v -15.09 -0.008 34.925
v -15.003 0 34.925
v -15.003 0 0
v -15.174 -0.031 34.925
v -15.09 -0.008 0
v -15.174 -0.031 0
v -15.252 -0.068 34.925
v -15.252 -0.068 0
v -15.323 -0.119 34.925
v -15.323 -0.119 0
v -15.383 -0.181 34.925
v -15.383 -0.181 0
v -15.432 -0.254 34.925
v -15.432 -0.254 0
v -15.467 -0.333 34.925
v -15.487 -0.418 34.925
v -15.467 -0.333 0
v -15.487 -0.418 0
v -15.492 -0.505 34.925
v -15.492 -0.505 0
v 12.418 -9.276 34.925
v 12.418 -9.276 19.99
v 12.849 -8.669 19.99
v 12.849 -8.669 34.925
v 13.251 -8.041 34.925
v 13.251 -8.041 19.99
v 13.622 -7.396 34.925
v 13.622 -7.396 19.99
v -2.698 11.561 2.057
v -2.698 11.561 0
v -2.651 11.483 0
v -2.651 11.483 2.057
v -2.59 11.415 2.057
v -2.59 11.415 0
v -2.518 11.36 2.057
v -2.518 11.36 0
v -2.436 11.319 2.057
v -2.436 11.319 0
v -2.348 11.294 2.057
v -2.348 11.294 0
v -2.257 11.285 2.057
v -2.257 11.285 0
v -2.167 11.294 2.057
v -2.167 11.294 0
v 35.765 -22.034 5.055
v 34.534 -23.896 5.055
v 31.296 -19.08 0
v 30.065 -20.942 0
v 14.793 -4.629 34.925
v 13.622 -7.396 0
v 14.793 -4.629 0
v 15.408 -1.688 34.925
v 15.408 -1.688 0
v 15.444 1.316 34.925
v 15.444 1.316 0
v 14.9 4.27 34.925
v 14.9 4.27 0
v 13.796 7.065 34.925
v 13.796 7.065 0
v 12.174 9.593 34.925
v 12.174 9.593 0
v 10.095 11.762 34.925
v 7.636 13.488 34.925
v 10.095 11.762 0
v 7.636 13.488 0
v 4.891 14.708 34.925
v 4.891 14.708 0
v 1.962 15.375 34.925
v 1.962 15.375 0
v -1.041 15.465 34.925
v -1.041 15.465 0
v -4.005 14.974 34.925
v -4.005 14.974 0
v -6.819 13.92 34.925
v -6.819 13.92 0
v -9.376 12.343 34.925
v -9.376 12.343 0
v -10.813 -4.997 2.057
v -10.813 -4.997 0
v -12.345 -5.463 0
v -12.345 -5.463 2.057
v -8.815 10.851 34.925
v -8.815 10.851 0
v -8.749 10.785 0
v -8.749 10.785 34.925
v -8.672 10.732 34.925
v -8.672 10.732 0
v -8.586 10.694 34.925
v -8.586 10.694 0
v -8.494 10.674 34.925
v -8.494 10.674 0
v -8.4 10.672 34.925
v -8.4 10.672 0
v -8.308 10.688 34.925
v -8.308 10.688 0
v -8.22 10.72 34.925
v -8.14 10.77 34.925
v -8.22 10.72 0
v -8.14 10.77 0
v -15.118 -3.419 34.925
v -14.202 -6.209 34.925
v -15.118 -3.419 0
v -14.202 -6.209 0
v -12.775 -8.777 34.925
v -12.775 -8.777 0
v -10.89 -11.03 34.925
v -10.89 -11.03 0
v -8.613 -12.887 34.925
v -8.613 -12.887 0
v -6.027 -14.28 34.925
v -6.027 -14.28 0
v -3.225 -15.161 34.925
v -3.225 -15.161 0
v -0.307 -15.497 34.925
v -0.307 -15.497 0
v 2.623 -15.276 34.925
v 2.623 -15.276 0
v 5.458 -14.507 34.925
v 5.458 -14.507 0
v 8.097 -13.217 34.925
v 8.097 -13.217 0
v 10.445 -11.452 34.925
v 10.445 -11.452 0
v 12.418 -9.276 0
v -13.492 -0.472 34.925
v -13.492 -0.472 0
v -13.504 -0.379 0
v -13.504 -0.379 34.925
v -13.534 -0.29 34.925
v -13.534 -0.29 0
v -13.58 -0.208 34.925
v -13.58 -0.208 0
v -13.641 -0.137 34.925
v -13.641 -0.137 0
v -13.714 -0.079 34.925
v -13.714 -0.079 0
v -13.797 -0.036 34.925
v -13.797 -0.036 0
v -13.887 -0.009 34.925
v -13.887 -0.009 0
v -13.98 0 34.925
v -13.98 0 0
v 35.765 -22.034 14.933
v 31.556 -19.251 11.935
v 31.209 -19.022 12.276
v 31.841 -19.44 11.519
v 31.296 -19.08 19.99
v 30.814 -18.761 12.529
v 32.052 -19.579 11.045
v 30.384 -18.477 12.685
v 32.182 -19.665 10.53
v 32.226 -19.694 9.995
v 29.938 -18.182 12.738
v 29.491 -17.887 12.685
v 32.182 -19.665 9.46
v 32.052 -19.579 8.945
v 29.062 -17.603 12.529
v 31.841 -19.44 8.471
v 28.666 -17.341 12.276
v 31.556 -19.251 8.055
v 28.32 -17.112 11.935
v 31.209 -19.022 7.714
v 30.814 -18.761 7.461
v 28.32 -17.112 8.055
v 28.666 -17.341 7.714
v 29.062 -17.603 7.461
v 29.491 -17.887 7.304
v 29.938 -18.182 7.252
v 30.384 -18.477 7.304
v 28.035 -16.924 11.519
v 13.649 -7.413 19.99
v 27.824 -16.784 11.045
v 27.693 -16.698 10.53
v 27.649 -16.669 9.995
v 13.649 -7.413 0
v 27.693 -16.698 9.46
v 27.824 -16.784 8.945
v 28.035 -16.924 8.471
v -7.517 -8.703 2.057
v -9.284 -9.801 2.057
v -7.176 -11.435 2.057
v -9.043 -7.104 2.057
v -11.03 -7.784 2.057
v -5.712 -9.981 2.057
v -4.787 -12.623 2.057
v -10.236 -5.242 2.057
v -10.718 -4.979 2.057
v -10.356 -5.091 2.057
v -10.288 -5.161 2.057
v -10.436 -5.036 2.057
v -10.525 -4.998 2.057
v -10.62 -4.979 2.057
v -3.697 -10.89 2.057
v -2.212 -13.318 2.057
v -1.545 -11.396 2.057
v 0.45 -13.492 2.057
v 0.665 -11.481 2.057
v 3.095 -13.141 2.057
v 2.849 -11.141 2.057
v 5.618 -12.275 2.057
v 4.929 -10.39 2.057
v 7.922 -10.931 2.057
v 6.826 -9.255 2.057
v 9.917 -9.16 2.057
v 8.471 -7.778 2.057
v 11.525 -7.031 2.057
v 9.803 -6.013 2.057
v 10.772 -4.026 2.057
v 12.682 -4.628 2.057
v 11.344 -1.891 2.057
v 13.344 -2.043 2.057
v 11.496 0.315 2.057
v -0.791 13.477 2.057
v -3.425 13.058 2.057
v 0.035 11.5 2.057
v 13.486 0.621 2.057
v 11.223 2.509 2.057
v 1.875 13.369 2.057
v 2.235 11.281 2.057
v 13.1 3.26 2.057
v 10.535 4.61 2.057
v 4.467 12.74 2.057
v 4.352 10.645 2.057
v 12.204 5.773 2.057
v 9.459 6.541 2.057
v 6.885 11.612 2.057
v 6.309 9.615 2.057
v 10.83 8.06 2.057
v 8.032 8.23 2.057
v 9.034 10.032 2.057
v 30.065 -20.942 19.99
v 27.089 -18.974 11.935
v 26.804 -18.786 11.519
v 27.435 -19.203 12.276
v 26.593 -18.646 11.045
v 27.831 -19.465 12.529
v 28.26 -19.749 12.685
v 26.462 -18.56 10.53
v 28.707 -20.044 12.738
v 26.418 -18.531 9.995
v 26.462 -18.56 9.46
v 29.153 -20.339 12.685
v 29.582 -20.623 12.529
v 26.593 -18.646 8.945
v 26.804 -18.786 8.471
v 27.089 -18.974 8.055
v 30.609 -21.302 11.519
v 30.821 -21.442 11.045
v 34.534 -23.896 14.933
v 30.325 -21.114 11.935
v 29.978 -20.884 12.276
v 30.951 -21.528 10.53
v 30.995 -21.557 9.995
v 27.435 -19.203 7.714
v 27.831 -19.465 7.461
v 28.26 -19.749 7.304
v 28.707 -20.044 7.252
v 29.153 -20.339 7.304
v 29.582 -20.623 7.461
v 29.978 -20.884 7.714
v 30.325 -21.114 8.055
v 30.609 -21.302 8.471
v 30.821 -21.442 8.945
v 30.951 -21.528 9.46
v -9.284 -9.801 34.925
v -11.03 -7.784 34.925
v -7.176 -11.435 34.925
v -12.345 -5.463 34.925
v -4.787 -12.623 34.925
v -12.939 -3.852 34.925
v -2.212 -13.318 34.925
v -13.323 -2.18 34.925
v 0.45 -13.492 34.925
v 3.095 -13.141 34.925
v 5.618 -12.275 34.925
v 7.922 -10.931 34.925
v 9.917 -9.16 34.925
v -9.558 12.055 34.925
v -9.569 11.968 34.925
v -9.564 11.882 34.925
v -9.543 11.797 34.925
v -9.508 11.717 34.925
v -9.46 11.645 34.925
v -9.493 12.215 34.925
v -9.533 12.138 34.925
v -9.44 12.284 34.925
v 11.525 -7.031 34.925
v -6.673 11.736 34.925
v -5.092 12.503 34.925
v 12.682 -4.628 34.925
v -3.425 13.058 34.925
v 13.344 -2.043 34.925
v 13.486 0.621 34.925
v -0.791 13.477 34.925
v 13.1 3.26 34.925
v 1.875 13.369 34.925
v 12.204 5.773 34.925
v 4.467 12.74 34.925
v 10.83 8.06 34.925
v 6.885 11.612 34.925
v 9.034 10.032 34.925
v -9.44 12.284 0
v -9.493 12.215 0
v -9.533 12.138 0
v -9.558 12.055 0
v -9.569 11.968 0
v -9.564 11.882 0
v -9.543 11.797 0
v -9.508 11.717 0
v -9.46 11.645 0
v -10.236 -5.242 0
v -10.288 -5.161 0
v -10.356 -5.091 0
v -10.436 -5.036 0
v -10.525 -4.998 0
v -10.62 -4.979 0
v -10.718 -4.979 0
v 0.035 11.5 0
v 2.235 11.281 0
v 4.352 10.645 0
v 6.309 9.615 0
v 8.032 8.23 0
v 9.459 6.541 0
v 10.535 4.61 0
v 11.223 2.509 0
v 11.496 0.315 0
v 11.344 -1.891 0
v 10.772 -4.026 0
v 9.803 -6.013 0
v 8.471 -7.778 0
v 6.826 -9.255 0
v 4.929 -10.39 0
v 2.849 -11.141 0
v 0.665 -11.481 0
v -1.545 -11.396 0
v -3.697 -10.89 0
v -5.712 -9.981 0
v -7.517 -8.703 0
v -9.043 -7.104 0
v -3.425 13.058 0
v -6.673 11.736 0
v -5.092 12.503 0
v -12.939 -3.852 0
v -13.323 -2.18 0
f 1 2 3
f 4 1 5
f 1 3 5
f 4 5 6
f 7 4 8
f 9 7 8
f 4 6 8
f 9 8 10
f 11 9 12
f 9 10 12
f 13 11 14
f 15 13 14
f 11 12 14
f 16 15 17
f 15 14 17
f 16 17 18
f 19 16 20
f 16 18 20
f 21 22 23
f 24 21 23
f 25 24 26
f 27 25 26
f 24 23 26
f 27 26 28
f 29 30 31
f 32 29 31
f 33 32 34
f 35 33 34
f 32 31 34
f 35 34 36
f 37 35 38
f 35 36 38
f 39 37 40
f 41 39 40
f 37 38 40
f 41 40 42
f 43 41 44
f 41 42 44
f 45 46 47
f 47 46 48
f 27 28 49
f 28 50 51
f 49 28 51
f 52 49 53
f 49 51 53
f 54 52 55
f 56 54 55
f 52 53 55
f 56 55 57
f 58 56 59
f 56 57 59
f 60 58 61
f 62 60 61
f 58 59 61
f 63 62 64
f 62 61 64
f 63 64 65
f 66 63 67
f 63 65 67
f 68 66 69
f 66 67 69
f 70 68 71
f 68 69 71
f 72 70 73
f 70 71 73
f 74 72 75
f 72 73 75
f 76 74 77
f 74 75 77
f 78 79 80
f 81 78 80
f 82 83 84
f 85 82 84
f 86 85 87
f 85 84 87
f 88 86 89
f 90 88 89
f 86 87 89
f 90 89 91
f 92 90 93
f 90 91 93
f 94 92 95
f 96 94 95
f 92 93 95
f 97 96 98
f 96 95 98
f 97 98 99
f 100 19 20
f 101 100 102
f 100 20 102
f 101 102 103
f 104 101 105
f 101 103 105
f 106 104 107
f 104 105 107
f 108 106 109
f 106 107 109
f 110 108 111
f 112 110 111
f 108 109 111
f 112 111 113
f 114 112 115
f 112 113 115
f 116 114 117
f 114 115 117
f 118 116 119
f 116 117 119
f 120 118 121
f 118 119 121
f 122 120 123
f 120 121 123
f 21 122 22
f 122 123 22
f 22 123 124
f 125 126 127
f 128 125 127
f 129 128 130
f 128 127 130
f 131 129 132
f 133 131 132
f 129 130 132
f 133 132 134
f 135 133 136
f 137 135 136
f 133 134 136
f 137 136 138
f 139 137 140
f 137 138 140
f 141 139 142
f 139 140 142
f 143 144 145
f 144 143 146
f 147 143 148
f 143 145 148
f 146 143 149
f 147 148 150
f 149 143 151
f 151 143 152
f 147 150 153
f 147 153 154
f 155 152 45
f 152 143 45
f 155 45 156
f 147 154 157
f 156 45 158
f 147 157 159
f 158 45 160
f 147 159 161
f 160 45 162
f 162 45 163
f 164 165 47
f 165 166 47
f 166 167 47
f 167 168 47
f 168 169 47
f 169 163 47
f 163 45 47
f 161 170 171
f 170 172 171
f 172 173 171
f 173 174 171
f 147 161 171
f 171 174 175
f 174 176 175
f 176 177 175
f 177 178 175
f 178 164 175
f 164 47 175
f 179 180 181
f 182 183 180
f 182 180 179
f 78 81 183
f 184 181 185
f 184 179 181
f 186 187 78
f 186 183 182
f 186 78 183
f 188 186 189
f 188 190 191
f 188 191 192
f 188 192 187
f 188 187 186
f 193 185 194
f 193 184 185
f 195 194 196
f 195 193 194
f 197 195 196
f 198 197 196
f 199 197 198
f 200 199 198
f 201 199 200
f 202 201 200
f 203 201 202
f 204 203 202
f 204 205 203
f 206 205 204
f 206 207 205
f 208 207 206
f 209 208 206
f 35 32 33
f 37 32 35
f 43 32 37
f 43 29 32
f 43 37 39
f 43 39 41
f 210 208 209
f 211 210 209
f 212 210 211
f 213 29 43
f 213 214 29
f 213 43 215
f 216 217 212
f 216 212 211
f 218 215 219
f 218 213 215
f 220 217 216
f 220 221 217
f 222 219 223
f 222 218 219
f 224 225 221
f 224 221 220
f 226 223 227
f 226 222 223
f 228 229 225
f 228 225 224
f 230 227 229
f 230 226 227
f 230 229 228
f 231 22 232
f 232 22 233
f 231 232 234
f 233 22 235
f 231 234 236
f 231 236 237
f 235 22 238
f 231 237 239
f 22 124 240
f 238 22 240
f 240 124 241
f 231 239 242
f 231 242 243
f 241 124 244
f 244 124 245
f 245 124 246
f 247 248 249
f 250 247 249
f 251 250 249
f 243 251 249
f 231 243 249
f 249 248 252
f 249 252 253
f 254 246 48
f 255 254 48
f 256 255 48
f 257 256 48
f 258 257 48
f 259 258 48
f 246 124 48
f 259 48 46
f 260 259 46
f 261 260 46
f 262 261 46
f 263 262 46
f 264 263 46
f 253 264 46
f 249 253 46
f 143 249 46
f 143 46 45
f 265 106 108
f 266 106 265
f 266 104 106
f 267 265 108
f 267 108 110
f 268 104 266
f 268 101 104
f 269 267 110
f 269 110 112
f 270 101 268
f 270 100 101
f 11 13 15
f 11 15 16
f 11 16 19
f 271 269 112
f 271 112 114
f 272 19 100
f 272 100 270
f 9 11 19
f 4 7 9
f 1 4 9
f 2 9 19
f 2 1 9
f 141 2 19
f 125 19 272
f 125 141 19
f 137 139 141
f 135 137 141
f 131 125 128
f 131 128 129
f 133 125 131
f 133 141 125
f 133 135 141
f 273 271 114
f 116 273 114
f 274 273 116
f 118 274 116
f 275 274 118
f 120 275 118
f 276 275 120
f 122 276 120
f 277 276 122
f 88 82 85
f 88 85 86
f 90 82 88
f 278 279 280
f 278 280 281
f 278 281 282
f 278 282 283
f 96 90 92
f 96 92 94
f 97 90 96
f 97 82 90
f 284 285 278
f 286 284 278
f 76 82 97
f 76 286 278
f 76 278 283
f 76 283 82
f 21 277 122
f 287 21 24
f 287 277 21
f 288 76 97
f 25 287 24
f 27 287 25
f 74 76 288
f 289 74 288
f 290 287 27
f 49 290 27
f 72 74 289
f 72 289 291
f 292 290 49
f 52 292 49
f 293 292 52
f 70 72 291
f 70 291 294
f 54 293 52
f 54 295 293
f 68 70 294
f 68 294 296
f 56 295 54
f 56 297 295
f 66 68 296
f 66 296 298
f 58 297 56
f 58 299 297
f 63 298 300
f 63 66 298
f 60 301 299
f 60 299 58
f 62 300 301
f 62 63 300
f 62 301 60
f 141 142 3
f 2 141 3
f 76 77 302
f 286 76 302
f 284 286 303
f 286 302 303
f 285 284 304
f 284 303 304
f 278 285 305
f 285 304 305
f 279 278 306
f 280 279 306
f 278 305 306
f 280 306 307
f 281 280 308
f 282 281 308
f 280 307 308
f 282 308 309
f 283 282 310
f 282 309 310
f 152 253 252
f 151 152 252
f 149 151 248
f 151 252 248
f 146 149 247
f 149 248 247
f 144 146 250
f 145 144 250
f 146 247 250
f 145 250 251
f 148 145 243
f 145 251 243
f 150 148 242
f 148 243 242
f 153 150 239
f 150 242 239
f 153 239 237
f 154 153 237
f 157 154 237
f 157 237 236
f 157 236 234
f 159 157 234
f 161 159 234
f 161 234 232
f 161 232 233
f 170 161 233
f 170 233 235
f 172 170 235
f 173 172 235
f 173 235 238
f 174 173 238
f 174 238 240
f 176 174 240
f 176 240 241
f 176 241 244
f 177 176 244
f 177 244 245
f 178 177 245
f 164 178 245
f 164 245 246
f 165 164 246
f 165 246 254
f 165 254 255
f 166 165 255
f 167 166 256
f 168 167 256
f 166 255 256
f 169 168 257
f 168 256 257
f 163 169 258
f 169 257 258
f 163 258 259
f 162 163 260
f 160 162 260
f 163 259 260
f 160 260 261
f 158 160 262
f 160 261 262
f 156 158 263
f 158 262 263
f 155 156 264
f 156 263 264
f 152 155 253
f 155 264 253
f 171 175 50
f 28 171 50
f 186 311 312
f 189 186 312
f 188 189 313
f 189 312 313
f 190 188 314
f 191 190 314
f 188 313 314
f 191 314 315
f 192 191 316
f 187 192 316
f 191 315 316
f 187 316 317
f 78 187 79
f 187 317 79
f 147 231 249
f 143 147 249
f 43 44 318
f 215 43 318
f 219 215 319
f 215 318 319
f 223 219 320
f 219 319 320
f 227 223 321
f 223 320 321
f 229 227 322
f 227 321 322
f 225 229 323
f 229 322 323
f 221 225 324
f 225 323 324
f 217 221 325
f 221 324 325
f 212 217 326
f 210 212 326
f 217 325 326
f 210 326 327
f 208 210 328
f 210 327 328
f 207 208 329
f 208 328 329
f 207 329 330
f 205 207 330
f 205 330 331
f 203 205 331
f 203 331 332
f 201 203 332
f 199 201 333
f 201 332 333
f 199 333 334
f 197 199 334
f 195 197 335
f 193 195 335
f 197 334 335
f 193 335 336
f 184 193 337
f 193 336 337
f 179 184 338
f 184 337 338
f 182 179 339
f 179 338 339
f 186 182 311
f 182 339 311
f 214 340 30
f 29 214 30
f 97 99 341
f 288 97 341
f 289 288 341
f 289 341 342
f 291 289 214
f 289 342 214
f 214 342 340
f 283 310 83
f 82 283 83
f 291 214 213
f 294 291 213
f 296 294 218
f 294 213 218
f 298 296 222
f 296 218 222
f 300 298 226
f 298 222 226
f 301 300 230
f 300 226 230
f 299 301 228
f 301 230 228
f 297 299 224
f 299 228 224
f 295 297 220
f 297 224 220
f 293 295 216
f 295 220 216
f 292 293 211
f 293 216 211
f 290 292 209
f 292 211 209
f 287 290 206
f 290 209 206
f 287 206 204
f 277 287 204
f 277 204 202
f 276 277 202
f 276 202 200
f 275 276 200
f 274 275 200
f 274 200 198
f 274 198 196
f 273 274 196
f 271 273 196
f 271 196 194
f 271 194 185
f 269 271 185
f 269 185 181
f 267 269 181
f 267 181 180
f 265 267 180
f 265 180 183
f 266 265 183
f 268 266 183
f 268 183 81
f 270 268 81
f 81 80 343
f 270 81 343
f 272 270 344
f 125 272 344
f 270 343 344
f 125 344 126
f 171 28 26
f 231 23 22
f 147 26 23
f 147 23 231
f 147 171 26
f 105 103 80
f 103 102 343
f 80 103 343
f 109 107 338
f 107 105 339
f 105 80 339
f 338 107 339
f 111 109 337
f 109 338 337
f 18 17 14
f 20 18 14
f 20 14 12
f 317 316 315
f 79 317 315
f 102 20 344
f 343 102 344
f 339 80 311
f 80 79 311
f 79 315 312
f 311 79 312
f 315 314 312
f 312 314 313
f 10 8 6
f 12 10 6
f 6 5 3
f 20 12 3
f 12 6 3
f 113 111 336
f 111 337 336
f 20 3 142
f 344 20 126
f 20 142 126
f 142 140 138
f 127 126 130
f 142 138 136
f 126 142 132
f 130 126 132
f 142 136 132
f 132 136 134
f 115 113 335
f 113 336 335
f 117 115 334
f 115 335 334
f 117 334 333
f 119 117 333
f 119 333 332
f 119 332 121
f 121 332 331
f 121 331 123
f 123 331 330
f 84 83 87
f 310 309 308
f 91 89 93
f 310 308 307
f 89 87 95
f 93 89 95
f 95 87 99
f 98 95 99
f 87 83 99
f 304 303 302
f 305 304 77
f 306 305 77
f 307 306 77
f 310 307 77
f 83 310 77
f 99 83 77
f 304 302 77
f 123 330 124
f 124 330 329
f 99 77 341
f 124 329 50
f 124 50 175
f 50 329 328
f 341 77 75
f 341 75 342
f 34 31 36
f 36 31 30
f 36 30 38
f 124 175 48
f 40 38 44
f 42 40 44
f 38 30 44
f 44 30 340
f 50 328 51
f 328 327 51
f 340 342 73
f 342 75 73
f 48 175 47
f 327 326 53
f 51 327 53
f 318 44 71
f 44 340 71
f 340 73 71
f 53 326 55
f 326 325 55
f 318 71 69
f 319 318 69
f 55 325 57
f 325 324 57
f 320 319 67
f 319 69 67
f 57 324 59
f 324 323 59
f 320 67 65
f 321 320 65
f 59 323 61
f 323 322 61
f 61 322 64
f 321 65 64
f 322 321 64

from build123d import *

# Parameters (mm, degrees)
F1_DEPTH = 34.925
F2_DEPTH = 2.0574
F3_DEPTH = 19.9898
F5_DEPTH = 25.4
F6_R     = 2.7432
F7_DEPTH = 6.35


with BuildPart() as f1:
    # F0 (on Top) → F1 (new body)
    with BuildSketch(Plane.XY):
        with BuildLine():
            ThreePointArc((-12.3453600693, -5.4627909314), (-13.1573816932, -3.0221361616), (-13.4917542774, -0.4717695609))
            ThreePointArc((-13.4917542774, -0.4717695609), (-13.6407310124, -0.1371936881), (-13.9803086533, 0))
            Line((-13.9803086533, 0), (-15.0031849319, 0))
            ThreePointArc((-15.0031849319, 0), (-15.3544396488, -0.1488568693), (-15.4917786026, -0.5047729485))
            ThreePointArc((-15.4917786026, -0.5047729485), (-4.6469501431, -14.7870164119), (12.418172291, -9.2757208319))
            ThreePointArc((12.418172291, -9.2757208319), (13.0538627177, -8.357431911), (13.6217786378, -7.395751939))
            ThreePointArc((13.6217786378, -7.395751939), (10.0950215904, 11.7618254999), (-9.3758099768, 12.3427787503))
            ThreePointArc((-9.3758099768, 12.3427787503), (-9.5654748501, 12.0117719837), (-9.4595485787, 11.645277961))
            Line((-9.4595485787, 11.645277961), (-8.8146223253, 10.8513346324))
            ThreePointArc((-8.8146223253, 10.8513346324), (-8.4940297415, 10.6742598531), (-8.140406046, 10.7695770301))
            ThreePointArc((-8.140406046, 10.7695770301), (-5.8949637992, 12.1449331742), (-3.4252504313, 13.0582410563))
            ThreePointArc((-3.4252504313, 13.0582410563), (12.1628613148, -5.8578839727), (-12.3453600693, -5.4627909314))
        make_face()
    extrude(amount=F1_DEPTH)

    # F0 (on Top) → F2 (join)
    with BuildSketch(Plane.XY):
        with BuildLine():
            Line((-10.812776349, -4.9974023539), (-12.3453600693, -5.4627909314))
            ThreePointArc((-12.3453600693, -5.4627909314), (12.1628613148, -5.8578839727), (-3.4252504313, 13.0582410563))
            Line((-3.4252504313, 13.0582410563), (-2.6983841205, 11.5607179889))
            ThreePointArc((-2.6983841205, 11.5607179889), (-2.4776784158, 11.3371662815), (-2.1665031819, 11.294080926))
            ThreePointArc((-2.1665031819, 11.294080926), (10.3351994601, -5.0431787713), (-10.2356285878, -5.2423188965))
            ThreePointArc((-10.2356285878, -5.2423188965), (-10.4797694006, -5.0151537509), (-10.812776349, -4.9974023539))
        make_face()
    extrude(amount=F2_DEPTH)

    # F0 (on Top) → F3 (join)
    with BuildSketch(Plane.XY):
        with BuildLine():
            ThreePointArc((13.6217786378, -7.395751939), (13.0538627177, -8.357431911), (12.418172291, -9.2757208319))
            Line((12.418172291, -9.2757208319), (34.5335465265, -23.8959513212))
            Line((34.5335465265, -23.8959513212), (35.7646481522, -22.033718493))
            Line((35.7646481522, -22.033718493), (13.6492739167, -7.4134880037))
            Line((13.6492739167, -7.4134880037), (13.6217786378, -7.395751939))
        make_face()
    extrude(amount=F3_DEPTH)

    # F4 (on face) → F5 (cut)
    with BuildSketch(Plane(origin=(-0.4904917501, -0.7419451164, 0), x_dir=(0.8341915273, -0.551474837, 0), z_dir=(-0.551474837, -0.8341915273, 0))):
        Polygon((41.9856077785, 5.0546), (36.6286821663, 0), (41.9856077785, 0), align=None)
        Polygon((41.9856077785, 19.9898), (36.6286821663, 19.9898), (41.9856077785, 14.9331064895), align=None)
    extrude(amount=-F5_DEPTH, mode=Mode.SUBTRACT)

    # F6 (on face) → F7 (cut)
    with BuildSketch(Plane(origin=(-0.4904917501, -0.7419451164, 0), x_dir=(0.8341915273, -0.551474837, 0), z_dir=(-0.551474837, -0.8341915273, 0))):
        with Locations((35.0006077785, 9.9949)):
            Circle(F6_R)
    extrude(amount=-F7_DEPTH, mode=Mode.SUBTRACT)


solid = f1.part
